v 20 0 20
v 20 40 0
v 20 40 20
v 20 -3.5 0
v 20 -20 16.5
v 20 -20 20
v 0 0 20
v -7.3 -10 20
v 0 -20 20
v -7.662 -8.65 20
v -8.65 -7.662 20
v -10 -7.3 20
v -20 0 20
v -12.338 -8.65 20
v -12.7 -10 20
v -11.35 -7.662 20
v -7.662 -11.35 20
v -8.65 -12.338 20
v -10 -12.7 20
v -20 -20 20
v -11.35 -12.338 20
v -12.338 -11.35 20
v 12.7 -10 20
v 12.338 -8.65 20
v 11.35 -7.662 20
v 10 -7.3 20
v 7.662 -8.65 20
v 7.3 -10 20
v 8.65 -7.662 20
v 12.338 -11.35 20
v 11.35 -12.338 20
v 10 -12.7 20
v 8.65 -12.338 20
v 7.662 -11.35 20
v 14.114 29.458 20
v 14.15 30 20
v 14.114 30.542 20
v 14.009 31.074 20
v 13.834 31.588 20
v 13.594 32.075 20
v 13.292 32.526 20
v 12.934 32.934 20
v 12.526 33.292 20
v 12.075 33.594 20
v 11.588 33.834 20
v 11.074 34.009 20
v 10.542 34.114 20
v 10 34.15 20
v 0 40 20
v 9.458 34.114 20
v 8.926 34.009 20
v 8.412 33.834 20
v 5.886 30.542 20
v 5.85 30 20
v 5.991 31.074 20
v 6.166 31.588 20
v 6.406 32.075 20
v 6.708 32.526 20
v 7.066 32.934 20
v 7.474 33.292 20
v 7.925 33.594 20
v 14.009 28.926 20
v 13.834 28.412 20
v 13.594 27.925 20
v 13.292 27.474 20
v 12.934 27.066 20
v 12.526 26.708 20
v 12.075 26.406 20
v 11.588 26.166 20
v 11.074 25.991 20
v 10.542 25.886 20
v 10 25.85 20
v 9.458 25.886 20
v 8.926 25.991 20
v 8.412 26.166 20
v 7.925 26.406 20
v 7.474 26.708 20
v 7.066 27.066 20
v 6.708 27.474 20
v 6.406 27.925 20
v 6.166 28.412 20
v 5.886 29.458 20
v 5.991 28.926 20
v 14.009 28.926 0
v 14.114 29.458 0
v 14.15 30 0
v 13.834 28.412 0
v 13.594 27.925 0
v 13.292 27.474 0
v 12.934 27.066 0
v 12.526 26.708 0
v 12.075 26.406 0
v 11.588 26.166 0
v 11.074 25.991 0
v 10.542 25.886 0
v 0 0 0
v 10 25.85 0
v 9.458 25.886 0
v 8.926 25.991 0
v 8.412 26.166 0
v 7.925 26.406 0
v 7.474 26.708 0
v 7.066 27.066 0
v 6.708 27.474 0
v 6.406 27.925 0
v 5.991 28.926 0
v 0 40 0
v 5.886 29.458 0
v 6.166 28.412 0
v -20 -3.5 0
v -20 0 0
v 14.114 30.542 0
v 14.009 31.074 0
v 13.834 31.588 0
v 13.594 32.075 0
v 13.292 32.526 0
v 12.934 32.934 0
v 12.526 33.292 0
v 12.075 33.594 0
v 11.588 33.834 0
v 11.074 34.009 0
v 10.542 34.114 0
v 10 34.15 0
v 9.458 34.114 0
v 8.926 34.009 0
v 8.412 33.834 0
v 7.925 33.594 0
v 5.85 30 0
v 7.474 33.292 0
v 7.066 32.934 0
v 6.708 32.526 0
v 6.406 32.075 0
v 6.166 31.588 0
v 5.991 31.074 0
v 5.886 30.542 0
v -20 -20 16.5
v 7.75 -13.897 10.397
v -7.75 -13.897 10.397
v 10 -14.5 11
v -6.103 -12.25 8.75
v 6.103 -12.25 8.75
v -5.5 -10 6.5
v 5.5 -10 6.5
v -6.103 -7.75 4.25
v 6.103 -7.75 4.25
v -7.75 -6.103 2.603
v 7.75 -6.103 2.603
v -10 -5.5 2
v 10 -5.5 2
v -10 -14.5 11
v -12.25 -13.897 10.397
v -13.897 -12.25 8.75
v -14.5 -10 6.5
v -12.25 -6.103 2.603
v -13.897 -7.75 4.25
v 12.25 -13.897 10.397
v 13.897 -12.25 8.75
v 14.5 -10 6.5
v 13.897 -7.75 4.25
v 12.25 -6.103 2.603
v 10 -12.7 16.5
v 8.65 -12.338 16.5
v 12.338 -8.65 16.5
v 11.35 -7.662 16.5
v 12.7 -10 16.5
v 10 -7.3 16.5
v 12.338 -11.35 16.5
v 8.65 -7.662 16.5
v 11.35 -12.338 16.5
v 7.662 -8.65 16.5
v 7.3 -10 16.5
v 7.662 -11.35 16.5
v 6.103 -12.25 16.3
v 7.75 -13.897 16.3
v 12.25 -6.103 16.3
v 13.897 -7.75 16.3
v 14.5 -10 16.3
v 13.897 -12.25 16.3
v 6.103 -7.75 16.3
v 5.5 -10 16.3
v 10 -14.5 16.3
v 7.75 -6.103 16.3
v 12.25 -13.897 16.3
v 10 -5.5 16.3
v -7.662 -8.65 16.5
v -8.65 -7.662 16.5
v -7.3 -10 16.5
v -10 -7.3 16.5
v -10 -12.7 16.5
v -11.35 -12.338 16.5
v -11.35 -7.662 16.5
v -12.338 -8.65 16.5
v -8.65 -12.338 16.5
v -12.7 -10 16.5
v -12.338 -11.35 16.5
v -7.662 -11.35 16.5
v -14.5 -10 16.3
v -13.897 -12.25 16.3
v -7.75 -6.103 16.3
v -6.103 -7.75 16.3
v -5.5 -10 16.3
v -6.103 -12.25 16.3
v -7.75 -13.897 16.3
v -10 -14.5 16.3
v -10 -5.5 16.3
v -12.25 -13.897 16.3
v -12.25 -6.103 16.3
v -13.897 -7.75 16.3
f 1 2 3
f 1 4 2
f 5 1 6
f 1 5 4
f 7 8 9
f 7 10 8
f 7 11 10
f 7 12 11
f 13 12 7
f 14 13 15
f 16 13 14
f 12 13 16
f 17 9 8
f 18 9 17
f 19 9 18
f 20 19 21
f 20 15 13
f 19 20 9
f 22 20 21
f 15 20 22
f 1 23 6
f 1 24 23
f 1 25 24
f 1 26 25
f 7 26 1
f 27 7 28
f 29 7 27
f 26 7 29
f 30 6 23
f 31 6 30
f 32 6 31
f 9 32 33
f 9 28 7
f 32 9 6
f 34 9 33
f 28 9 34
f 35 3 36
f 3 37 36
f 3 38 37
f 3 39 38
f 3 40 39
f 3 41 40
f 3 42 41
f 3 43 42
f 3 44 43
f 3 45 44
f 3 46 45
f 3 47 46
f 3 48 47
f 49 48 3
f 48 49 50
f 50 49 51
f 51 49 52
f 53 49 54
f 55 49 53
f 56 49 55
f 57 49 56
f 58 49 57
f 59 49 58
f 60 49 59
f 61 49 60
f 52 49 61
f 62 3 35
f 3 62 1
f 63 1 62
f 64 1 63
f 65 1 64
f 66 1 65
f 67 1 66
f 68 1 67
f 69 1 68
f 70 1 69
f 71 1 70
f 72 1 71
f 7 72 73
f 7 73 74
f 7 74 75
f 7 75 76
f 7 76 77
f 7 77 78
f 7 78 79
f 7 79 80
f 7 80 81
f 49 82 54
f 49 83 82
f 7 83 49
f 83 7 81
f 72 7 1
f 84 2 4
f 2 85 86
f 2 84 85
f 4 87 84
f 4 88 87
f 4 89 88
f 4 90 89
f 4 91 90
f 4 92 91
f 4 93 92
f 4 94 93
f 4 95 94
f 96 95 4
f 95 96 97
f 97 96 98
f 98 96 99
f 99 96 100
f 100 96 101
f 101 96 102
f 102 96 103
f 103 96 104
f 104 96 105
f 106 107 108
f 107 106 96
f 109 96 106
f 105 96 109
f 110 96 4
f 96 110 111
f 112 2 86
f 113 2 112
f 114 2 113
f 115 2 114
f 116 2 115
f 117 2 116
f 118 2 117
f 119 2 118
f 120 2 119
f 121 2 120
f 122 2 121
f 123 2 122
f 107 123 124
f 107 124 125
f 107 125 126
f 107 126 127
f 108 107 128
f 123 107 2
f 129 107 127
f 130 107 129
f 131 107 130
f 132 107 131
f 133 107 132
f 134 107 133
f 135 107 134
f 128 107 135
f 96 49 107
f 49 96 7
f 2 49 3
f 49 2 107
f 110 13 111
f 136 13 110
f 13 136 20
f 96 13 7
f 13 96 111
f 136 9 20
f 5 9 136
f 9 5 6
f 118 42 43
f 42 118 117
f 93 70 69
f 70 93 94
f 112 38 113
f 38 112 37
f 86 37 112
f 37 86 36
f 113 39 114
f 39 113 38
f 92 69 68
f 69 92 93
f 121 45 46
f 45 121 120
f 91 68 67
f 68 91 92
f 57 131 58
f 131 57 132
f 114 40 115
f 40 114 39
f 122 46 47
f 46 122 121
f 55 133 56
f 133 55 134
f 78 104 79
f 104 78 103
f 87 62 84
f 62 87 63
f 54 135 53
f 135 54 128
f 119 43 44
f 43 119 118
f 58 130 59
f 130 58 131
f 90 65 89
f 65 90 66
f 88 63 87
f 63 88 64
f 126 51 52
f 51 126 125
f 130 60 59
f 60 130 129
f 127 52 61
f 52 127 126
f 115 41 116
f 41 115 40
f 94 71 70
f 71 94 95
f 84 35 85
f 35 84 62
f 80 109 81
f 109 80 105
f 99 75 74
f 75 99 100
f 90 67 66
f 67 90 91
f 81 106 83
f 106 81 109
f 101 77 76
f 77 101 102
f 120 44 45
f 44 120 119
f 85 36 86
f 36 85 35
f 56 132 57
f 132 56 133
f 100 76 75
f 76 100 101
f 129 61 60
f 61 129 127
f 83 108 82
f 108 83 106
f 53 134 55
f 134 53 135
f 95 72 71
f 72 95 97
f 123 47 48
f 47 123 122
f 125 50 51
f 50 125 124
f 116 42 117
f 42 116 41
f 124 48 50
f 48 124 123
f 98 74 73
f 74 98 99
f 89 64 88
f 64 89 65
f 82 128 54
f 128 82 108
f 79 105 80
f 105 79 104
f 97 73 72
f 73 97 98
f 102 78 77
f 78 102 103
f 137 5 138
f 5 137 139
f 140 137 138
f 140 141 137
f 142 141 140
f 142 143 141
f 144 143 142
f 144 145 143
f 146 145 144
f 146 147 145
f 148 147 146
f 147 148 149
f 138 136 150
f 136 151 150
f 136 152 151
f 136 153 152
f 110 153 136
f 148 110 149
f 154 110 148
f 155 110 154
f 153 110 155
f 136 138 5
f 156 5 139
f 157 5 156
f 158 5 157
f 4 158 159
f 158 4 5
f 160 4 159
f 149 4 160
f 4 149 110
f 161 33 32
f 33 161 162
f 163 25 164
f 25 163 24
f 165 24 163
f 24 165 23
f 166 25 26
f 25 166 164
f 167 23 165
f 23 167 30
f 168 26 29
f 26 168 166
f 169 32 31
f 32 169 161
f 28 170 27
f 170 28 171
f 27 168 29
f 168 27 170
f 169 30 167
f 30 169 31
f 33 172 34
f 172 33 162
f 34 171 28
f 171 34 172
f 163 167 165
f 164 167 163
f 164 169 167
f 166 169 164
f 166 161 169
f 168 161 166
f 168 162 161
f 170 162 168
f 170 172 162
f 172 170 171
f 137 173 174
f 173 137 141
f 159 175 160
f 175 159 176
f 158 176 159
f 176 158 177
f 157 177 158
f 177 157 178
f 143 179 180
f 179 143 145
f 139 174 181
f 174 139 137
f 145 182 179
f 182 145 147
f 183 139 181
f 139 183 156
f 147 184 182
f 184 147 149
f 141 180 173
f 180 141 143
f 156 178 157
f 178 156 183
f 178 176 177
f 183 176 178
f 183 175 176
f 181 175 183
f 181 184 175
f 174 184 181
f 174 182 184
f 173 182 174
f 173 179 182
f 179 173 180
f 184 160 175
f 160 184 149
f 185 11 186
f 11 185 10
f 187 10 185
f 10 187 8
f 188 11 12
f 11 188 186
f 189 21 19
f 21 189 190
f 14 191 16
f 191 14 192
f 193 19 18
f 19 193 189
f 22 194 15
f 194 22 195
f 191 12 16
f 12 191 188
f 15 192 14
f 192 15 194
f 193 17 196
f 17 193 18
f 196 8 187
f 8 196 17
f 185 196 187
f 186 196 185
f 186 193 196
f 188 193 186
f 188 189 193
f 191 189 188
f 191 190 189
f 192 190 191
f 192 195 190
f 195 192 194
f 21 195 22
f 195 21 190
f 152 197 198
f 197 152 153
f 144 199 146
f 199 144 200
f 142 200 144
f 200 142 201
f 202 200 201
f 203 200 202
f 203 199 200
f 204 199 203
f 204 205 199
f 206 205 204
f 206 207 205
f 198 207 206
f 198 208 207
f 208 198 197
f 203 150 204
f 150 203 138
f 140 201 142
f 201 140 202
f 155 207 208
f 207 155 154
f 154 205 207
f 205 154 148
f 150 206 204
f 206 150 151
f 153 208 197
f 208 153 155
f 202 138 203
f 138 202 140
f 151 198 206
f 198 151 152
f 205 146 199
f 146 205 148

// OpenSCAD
t=3.5;

difference()
{
    union()
    {
        cube([20,40,20]);
        
        translate([-20,-20,0])
            cube([20,20,20]);
        
        translate([0,-20,0])
            cube([20,20,20]);
        
        //translate([-10,0,25])
        //    cube([40,t,15]);
        
        /*translate([-10,0,25])
            rotate([0,45,0])
                cube([40/sqrt(2),t,40/sqrt(2)]);*/
        
        //rotate([45,0,0])
           // cube([20,20*sqrt(2),20*sqrt(2)]);
    }
    union()
    {
        translate([0,-20,20])
            cube([20,20,20]);
        
        translate([0,0,40])
            cube([20,20,20]);
        
        translate([10,10+20,0])
            cylinder(d=8.3,h=40,$fn=48);
        
        /*translate([0,20,20+t])
            rotate([45,0,0])
                cube([20,20*sqrt(2),20*sqrt(2)]);*/
        
        translate([-20,-20,-20-t])
            rotate([45,0,0])
                cube([40,20*sqrt(2),20*sqrt(2)]);
        
        translate([10,-10,20-t])
            cylinder(d=5.4,h=t,$fn=12);
        translate([10,-10,0])
            cylinder(d=9,h=20-t-0.2,$fn=12);
            
        translate([10-20,-10,20-t])
            cylinder(d=5.4,h=t,$fn=12);
        translate([10-20,-10,0])
            cylinder(d=9,h=20-t-0.2,$fn=12);
        
        translate([-5,0,30])
            rotate([270,0,0])
                cylinder(d=5.4,h=t+1,$fn=12);
        translate([20+5,0,30])
            rotate([270,0,0])
                cylinder(d=5.4,h=t+1,$fn=12);
    }
}
